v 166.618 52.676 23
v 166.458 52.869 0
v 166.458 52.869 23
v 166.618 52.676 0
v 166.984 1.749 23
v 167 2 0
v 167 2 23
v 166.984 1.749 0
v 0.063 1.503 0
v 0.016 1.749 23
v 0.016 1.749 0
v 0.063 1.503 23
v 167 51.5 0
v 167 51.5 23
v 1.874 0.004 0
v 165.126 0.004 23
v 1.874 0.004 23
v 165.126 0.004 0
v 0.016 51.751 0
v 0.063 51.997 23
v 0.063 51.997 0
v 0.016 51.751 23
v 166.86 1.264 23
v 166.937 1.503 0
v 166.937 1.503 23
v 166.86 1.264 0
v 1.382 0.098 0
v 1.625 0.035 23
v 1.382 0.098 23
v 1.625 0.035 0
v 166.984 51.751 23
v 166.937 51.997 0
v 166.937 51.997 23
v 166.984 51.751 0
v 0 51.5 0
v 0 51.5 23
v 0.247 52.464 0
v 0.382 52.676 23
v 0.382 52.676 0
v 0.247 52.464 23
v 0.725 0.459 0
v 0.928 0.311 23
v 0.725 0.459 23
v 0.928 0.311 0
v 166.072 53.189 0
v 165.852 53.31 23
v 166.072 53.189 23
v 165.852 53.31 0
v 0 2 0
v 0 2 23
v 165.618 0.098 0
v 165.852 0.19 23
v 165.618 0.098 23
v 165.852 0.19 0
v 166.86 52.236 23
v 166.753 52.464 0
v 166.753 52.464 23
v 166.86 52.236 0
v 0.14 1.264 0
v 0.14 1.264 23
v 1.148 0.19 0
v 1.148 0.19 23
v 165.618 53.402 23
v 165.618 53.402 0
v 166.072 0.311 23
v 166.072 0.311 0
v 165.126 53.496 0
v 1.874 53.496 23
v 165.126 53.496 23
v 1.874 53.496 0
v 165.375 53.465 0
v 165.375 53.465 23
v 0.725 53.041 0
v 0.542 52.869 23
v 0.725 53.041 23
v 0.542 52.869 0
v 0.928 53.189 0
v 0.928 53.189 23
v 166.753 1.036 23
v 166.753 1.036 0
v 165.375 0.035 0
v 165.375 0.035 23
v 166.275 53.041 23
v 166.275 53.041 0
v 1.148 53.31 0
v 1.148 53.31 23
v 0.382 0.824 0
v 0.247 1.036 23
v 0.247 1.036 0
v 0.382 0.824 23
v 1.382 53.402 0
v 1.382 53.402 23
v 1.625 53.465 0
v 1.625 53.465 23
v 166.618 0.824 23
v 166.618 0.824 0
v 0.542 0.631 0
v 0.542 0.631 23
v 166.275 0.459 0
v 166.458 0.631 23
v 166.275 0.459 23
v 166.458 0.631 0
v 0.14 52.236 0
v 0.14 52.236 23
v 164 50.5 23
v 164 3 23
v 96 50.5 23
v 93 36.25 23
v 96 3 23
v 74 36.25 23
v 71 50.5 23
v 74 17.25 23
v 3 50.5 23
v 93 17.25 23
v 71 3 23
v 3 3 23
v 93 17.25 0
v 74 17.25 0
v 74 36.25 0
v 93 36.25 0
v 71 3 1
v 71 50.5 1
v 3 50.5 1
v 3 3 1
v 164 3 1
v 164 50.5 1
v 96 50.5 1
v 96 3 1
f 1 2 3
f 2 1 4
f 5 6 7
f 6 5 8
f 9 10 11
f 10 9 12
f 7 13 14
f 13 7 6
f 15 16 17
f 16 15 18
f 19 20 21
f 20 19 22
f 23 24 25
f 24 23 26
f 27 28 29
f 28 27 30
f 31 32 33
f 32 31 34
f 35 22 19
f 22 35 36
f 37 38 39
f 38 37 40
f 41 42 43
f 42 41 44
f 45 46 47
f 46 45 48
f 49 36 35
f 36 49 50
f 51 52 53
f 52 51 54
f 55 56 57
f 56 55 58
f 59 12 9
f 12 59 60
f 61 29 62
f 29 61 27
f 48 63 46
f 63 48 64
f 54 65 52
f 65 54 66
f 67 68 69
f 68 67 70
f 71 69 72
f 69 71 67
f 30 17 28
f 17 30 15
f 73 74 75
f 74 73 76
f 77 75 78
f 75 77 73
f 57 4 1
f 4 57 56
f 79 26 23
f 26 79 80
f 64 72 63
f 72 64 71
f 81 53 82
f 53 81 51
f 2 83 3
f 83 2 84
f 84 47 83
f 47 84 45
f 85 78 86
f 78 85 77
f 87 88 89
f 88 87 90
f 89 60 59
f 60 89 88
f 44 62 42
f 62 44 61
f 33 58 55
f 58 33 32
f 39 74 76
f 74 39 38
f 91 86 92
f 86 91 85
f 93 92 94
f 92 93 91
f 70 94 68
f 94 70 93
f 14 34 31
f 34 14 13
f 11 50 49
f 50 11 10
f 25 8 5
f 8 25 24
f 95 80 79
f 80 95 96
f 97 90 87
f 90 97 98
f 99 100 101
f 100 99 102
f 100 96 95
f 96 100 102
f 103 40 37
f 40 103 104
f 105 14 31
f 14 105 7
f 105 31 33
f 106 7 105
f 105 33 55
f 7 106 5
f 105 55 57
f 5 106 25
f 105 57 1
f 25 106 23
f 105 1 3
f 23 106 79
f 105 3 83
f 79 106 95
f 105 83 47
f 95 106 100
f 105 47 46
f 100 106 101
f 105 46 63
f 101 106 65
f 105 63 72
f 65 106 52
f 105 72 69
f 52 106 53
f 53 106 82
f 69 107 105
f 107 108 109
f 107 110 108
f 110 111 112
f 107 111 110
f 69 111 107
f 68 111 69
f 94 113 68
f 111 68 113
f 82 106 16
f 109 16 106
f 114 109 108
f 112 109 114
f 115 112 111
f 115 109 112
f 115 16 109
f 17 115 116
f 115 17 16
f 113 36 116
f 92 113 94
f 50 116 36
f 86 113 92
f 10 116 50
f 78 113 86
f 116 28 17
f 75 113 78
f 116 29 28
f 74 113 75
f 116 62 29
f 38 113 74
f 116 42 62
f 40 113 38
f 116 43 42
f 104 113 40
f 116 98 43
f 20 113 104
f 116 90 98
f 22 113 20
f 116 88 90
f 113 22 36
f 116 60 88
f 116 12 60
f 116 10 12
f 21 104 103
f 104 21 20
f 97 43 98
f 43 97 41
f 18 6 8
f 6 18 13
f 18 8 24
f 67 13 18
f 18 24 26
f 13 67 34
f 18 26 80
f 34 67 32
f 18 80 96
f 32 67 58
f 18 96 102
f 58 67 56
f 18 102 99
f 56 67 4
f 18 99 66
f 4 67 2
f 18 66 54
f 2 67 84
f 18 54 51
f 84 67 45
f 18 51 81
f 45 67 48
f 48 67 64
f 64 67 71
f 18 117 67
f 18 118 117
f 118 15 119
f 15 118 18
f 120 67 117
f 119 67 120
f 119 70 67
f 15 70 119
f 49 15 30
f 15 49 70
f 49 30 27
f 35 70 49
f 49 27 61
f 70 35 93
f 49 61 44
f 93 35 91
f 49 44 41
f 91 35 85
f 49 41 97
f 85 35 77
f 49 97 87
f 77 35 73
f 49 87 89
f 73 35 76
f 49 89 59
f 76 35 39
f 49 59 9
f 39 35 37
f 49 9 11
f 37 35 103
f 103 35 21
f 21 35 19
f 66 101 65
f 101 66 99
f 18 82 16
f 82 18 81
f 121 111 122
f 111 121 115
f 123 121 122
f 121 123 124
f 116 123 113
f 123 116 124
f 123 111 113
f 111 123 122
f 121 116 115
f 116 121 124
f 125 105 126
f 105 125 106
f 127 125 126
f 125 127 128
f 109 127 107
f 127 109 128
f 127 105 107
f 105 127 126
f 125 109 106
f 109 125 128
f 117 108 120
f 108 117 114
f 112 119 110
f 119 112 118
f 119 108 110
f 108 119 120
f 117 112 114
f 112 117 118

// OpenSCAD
length = 167;
rimThickness = 2;
rimPadding = 1.5;
magnetHoleWidth = 19;
wallThickness = 3;
floorThickness = 1;
width = 59 - (rimThickness * 2 + rimPadding);
height = 23;

difference() {

    $fn=50;
    minkowski()
    {
      translate([2,2,0])
        cube([length-4, width-4, height - 1]);
      cylinder(r=2,h=1);
    }
    translate([wallThickness,wallThickness,floorThickness])
        cube([length/2 - (wallThickness * 2 + magnetHoleWidth/2), width - (wallThickness * 2), height - floorThickness]);
    translate([wallThickness + length/2 + magnetHoleWidth/2,wallThickness,floorThickness])
        cube([length/2 - (wallThickness * 2 + magnetHoleWidth/2), width - (wallThickness * 2), height - floorThickness]);
    translate([length/2 - magnetHoleWidth/2, width/2 - magnetHoleWidth/2, 0])
        cube([magnetHoleWidth, magnetHoleWidth, height]);
}
